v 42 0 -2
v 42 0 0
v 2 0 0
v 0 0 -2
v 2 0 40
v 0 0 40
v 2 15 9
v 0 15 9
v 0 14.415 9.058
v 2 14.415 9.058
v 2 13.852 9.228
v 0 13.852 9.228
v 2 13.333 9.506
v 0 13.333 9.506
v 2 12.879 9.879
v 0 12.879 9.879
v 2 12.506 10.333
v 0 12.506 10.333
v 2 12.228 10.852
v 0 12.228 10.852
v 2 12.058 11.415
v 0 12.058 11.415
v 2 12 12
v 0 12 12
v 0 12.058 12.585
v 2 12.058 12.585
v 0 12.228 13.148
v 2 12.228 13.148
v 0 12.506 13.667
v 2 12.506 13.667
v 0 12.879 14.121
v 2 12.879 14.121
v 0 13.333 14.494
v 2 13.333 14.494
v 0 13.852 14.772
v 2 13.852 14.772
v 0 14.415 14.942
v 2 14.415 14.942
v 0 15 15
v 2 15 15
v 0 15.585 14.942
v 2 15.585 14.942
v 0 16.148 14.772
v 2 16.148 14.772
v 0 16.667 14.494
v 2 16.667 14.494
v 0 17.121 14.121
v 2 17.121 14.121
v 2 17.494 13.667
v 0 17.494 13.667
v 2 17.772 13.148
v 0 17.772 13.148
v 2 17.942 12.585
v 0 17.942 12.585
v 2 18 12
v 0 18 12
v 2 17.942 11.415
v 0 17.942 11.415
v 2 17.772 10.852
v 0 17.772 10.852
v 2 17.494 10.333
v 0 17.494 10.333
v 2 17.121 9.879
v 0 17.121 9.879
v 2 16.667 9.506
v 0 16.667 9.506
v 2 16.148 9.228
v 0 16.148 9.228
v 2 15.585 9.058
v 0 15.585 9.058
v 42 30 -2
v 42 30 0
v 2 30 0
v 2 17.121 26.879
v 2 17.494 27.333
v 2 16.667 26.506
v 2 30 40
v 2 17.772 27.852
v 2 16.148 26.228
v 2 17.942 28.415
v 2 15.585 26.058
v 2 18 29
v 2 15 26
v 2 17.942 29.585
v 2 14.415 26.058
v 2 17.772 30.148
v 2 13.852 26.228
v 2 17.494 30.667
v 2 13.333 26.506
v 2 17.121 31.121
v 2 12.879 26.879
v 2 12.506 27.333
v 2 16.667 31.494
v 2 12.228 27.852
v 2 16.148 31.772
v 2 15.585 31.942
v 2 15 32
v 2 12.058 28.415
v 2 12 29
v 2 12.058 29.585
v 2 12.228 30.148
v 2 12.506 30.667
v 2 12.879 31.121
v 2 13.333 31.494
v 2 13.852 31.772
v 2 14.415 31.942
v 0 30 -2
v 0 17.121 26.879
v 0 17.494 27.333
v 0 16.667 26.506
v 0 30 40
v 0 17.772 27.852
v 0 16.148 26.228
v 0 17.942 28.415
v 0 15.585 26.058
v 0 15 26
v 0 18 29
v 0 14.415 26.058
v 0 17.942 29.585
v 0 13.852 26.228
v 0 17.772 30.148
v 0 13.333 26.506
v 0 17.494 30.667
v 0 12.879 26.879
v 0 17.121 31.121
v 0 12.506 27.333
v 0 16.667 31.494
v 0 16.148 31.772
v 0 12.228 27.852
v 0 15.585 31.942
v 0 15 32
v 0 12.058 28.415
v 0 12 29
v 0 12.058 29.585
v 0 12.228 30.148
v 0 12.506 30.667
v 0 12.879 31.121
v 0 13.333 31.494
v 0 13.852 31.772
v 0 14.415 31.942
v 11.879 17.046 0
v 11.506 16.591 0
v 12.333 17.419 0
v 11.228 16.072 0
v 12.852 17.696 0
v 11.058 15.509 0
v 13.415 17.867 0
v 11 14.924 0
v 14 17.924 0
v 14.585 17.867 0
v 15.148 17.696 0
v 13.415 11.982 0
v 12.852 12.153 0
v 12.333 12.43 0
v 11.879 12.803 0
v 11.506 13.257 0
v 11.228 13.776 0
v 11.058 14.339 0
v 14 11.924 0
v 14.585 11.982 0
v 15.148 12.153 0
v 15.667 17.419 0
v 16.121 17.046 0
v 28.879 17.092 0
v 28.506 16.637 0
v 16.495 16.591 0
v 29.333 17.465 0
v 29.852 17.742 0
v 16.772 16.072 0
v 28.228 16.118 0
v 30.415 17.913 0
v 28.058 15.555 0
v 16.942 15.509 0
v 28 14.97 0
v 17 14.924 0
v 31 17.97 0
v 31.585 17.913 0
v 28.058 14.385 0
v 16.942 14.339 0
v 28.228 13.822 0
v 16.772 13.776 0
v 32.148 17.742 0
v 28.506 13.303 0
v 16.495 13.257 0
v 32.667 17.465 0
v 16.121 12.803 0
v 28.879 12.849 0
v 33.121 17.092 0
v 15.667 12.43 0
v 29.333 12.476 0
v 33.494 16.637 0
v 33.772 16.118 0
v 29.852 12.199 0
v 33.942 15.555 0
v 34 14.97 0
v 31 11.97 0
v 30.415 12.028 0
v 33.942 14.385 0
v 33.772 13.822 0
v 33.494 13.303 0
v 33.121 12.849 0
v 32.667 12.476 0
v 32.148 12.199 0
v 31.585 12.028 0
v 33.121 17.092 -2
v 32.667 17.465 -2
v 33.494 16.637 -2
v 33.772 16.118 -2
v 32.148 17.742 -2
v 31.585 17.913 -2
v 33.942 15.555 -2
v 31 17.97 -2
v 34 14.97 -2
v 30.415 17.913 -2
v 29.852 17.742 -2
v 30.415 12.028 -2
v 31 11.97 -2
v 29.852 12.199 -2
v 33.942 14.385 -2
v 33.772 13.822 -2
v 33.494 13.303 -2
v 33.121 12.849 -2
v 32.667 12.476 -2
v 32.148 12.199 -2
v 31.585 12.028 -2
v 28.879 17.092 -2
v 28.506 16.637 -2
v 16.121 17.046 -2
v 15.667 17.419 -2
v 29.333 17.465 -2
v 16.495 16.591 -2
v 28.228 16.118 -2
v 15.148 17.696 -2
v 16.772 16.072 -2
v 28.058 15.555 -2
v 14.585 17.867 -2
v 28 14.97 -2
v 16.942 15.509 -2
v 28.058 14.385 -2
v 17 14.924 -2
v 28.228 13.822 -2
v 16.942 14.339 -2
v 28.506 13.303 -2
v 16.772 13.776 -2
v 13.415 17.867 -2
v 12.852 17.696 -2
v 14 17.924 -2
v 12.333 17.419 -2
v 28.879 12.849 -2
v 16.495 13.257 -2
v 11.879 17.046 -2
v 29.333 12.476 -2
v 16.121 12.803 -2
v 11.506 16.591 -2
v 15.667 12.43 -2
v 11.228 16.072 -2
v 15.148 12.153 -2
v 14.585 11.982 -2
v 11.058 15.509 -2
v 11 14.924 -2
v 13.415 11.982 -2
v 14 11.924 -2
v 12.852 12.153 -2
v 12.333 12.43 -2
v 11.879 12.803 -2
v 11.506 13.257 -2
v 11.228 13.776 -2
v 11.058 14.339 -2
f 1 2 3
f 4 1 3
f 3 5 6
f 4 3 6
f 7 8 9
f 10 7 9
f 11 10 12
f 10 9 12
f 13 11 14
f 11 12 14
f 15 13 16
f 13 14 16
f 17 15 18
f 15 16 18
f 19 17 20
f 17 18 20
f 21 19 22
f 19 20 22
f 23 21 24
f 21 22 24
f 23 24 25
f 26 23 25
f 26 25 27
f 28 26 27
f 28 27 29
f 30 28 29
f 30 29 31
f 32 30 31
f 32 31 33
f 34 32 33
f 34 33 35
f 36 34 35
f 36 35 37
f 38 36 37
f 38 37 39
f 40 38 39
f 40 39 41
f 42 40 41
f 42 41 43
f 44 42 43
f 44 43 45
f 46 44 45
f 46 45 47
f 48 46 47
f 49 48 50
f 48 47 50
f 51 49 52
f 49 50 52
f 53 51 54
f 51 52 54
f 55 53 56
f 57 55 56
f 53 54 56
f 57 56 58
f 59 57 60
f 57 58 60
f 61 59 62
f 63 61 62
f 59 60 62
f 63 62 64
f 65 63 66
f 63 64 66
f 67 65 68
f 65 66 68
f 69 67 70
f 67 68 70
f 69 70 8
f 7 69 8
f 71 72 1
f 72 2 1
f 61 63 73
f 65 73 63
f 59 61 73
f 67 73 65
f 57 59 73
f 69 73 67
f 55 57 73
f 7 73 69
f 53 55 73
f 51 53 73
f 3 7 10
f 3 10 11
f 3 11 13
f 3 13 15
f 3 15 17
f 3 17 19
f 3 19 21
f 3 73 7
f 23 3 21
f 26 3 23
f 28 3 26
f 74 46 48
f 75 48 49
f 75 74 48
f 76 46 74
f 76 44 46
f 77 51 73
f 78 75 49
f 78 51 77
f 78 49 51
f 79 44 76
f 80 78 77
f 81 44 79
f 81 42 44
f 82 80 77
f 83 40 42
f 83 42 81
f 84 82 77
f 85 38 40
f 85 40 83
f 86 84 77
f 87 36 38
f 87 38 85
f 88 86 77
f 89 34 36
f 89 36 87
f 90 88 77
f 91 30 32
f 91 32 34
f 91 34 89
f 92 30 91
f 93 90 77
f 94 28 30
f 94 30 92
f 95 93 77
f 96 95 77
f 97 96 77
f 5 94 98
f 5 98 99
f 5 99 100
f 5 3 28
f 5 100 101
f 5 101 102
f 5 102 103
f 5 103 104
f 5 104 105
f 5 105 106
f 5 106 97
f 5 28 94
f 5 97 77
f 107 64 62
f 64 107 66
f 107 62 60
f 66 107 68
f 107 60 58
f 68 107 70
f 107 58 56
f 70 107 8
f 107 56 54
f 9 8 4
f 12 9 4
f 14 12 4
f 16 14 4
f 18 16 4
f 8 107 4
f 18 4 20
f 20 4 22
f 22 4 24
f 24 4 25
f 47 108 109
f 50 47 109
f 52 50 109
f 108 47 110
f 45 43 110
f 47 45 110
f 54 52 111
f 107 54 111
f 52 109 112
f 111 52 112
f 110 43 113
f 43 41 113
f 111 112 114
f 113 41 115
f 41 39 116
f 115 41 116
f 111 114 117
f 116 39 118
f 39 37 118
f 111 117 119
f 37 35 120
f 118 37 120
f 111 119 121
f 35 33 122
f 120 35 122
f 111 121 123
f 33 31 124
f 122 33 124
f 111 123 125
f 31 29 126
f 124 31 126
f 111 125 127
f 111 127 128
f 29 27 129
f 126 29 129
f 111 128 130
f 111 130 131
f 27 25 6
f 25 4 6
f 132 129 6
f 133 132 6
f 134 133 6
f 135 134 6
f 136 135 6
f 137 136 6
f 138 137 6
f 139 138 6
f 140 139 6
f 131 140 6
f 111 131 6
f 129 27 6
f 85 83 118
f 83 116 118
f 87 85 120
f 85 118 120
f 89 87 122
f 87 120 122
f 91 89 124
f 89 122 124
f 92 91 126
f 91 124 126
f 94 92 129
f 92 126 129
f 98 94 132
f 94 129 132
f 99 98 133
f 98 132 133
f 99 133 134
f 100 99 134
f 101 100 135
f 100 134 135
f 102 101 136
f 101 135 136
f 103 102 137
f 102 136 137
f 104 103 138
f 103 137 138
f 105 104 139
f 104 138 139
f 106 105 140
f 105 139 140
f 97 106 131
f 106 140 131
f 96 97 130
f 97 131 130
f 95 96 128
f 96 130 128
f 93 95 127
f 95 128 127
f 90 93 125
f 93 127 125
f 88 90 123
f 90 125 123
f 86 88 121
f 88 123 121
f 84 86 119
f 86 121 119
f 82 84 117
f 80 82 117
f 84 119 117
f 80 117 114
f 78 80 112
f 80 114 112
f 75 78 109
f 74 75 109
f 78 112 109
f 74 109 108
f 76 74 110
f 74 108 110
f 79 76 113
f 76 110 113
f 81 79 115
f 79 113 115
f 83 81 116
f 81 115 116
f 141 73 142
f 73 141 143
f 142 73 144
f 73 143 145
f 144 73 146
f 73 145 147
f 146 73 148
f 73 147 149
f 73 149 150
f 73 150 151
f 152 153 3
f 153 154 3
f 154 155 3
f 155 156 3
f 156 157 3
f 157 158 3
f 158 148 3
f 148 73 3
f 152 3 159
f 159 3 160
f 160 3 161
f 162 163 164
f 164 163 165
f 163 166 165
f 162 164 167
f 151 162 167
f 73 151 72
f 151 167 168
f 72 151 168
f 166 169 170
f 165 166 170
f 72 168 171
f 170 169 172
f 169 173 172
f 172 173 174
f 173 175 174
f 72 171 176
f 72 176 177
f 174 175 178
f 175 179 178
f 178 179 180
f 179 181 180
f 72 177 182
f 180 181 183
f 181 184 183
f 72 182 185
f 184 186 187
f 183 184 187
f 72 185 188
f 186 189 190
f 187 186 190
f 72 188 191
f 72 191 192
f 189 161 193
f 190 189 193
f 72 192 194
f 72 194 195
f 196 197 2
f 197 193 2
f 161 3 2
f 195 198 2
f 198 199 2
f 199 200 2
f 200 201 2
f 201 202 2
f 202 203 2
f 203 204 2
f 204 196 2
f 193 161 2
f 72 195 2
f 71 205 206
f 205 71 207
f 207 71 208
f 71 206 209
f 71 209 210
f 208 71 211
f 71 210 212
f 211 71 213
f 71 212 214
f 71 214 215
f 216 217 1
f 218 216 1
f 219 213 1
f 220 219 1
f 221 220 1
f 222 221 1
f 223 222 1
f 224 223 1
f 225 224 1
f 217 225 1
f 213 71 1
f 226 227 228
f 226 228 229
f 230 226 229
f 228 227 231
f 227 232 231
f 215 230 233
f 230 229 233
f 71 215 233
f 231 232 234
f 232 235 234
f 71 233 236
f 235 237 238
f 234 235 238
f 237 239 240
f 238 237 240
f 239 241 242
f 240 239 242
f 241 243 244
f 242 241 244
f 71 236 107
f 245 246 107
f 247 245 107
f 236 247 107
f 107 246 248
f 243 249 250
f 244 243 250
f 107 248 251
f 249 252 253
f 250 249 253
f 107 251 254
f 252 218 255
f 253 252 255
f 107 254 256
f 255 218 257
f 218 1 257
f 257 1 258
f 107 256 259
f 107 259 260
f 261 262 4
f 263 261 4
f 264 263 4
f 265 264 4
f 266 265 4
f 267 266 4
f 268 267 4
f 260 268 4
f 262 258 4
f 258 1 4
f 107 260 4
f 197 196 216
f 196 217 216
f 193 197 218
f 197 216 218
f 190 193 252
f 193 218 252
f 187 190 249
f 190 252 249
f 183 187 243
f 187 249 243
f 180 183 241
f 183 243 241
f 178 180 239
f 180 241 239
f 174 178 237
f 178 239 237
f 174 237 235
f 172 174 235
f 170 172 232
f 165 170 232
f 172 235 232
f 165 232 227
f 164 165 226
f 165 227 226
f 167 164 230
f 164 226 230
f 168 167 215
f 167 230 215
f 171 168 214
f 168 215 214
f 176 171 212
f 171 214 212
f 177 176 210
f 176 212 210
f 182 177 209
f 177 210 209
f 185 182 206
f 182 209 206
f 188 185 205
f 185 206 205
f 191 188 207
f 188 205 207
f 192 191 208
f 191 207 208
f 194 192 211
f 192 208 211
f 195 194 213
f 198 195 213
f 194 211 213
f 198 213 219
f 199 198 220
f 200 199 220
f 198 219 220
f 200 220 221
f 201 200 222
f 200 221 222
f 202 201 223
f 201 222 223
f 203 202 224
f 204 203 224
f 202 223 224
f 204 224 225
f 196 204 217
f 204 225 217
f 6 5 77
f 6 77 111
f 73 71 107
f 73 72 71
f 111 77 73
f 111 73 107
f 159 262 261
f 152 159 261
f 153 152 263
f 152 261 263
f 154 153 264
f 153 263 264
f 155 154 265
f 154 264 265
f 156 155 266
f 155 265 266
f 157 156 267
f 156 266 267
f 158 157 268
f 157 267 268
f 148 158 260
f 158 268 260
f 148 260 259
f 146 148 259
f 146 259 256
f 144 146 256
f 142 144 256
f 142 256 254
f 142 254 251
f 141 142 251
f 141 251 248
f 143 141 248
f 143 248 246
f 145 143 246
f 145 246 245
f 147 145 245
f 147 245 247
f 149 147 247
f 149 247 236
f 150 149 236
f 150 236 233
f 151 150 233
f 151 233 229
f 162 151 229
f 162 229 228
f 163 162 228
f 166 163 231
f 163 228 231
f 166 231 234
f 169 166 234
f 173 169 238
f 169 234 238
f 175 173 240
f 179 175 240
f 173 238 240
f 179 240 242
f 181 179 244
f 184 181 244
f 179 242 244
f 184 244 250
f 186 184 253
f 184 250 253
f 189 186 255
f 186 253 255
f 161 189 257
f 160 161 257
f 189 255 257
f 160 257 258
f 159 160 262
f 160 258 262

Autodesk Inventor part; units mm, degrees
ref_plane "YZ Plane" through (0, 0, 0) normal (1, 0, 0) x (0, 1, 0)
ref_plane "XZ Plane" through (0, 0, 0) normal (0, 1, 0) x (-1, 0, 0)
ref_plane "XY Plane" through (0, 0, 0) normal (0, 0, 1) x (1, 0, 0)
sketch "Sketch1" plane through (0, 0, 0) normal (0, 1, 0) x (-1, 0, 0)
  line L0 (0, 0) -> (-2, 0)
  line L1 (-2, 0) -> (-2, 40)
  line L2 (-2, 40) -> (0, 40)
  line L3 (0, 40) -> (0, 0)
  line L4 (0, 0) -> (-42, 0)
  line L5 (-42, 0) -> (-42, -2)
  line L6 (-42, -2) -> (0, -2)
  line L7 (0, -2) -> (0, 0)
  dimension "d0" = 2
  dimension "d1" = 40
  dimension "d2" = 42
  dimension "d3" = 2
extrude "Extrusion1" add sketch "Sketch1" along normal blind 30
sketch "Sketch2" plane through (2, 0, 0) normal (0, 0, 1) x (1, 0, 0)
  line L0 (40.0406, 0) -> (40, 14.9999)
  line L1 (40, 0) -> (40, 30) projected
  line L2 (40, 14.9999) -> (29, 14.9702)
  line L3 (29, 14.9702) -> (12.0001, 14.9242)
  point P0 (-2, 0)
  dimension "d6" = 15
  dimension "d7" = 11
  dimension "d8" = 17
hole "Hole1" at (31, 14.9702, 0) at (14.0001, 14.9242, 0) direction (0, 0, -1) diameter 6 end through all
sketch "Sketch3" plane through (2, 0, 40) normal (1, 0, 0) x (0, 0, -1)
  line L0 (0, 0) -> (0, 30) projected
  line L1 (0, 0) -> (0, 15)
  line L2 (0, 15) -> (11, 15)
  line L3 (11, 15) -> (28, 15)
  point P0 (40, 0)
  dimension "d16" = 15
  dimension "d17" = 11
  dimension "d18" = 17
hole "Hole2" at (2, 15, 29) at (2, 15, 12) direction (-1, 0, 0) diameter 6 end through all
properties part number "3030_L-Bracket" material "Aluminum 6061"
